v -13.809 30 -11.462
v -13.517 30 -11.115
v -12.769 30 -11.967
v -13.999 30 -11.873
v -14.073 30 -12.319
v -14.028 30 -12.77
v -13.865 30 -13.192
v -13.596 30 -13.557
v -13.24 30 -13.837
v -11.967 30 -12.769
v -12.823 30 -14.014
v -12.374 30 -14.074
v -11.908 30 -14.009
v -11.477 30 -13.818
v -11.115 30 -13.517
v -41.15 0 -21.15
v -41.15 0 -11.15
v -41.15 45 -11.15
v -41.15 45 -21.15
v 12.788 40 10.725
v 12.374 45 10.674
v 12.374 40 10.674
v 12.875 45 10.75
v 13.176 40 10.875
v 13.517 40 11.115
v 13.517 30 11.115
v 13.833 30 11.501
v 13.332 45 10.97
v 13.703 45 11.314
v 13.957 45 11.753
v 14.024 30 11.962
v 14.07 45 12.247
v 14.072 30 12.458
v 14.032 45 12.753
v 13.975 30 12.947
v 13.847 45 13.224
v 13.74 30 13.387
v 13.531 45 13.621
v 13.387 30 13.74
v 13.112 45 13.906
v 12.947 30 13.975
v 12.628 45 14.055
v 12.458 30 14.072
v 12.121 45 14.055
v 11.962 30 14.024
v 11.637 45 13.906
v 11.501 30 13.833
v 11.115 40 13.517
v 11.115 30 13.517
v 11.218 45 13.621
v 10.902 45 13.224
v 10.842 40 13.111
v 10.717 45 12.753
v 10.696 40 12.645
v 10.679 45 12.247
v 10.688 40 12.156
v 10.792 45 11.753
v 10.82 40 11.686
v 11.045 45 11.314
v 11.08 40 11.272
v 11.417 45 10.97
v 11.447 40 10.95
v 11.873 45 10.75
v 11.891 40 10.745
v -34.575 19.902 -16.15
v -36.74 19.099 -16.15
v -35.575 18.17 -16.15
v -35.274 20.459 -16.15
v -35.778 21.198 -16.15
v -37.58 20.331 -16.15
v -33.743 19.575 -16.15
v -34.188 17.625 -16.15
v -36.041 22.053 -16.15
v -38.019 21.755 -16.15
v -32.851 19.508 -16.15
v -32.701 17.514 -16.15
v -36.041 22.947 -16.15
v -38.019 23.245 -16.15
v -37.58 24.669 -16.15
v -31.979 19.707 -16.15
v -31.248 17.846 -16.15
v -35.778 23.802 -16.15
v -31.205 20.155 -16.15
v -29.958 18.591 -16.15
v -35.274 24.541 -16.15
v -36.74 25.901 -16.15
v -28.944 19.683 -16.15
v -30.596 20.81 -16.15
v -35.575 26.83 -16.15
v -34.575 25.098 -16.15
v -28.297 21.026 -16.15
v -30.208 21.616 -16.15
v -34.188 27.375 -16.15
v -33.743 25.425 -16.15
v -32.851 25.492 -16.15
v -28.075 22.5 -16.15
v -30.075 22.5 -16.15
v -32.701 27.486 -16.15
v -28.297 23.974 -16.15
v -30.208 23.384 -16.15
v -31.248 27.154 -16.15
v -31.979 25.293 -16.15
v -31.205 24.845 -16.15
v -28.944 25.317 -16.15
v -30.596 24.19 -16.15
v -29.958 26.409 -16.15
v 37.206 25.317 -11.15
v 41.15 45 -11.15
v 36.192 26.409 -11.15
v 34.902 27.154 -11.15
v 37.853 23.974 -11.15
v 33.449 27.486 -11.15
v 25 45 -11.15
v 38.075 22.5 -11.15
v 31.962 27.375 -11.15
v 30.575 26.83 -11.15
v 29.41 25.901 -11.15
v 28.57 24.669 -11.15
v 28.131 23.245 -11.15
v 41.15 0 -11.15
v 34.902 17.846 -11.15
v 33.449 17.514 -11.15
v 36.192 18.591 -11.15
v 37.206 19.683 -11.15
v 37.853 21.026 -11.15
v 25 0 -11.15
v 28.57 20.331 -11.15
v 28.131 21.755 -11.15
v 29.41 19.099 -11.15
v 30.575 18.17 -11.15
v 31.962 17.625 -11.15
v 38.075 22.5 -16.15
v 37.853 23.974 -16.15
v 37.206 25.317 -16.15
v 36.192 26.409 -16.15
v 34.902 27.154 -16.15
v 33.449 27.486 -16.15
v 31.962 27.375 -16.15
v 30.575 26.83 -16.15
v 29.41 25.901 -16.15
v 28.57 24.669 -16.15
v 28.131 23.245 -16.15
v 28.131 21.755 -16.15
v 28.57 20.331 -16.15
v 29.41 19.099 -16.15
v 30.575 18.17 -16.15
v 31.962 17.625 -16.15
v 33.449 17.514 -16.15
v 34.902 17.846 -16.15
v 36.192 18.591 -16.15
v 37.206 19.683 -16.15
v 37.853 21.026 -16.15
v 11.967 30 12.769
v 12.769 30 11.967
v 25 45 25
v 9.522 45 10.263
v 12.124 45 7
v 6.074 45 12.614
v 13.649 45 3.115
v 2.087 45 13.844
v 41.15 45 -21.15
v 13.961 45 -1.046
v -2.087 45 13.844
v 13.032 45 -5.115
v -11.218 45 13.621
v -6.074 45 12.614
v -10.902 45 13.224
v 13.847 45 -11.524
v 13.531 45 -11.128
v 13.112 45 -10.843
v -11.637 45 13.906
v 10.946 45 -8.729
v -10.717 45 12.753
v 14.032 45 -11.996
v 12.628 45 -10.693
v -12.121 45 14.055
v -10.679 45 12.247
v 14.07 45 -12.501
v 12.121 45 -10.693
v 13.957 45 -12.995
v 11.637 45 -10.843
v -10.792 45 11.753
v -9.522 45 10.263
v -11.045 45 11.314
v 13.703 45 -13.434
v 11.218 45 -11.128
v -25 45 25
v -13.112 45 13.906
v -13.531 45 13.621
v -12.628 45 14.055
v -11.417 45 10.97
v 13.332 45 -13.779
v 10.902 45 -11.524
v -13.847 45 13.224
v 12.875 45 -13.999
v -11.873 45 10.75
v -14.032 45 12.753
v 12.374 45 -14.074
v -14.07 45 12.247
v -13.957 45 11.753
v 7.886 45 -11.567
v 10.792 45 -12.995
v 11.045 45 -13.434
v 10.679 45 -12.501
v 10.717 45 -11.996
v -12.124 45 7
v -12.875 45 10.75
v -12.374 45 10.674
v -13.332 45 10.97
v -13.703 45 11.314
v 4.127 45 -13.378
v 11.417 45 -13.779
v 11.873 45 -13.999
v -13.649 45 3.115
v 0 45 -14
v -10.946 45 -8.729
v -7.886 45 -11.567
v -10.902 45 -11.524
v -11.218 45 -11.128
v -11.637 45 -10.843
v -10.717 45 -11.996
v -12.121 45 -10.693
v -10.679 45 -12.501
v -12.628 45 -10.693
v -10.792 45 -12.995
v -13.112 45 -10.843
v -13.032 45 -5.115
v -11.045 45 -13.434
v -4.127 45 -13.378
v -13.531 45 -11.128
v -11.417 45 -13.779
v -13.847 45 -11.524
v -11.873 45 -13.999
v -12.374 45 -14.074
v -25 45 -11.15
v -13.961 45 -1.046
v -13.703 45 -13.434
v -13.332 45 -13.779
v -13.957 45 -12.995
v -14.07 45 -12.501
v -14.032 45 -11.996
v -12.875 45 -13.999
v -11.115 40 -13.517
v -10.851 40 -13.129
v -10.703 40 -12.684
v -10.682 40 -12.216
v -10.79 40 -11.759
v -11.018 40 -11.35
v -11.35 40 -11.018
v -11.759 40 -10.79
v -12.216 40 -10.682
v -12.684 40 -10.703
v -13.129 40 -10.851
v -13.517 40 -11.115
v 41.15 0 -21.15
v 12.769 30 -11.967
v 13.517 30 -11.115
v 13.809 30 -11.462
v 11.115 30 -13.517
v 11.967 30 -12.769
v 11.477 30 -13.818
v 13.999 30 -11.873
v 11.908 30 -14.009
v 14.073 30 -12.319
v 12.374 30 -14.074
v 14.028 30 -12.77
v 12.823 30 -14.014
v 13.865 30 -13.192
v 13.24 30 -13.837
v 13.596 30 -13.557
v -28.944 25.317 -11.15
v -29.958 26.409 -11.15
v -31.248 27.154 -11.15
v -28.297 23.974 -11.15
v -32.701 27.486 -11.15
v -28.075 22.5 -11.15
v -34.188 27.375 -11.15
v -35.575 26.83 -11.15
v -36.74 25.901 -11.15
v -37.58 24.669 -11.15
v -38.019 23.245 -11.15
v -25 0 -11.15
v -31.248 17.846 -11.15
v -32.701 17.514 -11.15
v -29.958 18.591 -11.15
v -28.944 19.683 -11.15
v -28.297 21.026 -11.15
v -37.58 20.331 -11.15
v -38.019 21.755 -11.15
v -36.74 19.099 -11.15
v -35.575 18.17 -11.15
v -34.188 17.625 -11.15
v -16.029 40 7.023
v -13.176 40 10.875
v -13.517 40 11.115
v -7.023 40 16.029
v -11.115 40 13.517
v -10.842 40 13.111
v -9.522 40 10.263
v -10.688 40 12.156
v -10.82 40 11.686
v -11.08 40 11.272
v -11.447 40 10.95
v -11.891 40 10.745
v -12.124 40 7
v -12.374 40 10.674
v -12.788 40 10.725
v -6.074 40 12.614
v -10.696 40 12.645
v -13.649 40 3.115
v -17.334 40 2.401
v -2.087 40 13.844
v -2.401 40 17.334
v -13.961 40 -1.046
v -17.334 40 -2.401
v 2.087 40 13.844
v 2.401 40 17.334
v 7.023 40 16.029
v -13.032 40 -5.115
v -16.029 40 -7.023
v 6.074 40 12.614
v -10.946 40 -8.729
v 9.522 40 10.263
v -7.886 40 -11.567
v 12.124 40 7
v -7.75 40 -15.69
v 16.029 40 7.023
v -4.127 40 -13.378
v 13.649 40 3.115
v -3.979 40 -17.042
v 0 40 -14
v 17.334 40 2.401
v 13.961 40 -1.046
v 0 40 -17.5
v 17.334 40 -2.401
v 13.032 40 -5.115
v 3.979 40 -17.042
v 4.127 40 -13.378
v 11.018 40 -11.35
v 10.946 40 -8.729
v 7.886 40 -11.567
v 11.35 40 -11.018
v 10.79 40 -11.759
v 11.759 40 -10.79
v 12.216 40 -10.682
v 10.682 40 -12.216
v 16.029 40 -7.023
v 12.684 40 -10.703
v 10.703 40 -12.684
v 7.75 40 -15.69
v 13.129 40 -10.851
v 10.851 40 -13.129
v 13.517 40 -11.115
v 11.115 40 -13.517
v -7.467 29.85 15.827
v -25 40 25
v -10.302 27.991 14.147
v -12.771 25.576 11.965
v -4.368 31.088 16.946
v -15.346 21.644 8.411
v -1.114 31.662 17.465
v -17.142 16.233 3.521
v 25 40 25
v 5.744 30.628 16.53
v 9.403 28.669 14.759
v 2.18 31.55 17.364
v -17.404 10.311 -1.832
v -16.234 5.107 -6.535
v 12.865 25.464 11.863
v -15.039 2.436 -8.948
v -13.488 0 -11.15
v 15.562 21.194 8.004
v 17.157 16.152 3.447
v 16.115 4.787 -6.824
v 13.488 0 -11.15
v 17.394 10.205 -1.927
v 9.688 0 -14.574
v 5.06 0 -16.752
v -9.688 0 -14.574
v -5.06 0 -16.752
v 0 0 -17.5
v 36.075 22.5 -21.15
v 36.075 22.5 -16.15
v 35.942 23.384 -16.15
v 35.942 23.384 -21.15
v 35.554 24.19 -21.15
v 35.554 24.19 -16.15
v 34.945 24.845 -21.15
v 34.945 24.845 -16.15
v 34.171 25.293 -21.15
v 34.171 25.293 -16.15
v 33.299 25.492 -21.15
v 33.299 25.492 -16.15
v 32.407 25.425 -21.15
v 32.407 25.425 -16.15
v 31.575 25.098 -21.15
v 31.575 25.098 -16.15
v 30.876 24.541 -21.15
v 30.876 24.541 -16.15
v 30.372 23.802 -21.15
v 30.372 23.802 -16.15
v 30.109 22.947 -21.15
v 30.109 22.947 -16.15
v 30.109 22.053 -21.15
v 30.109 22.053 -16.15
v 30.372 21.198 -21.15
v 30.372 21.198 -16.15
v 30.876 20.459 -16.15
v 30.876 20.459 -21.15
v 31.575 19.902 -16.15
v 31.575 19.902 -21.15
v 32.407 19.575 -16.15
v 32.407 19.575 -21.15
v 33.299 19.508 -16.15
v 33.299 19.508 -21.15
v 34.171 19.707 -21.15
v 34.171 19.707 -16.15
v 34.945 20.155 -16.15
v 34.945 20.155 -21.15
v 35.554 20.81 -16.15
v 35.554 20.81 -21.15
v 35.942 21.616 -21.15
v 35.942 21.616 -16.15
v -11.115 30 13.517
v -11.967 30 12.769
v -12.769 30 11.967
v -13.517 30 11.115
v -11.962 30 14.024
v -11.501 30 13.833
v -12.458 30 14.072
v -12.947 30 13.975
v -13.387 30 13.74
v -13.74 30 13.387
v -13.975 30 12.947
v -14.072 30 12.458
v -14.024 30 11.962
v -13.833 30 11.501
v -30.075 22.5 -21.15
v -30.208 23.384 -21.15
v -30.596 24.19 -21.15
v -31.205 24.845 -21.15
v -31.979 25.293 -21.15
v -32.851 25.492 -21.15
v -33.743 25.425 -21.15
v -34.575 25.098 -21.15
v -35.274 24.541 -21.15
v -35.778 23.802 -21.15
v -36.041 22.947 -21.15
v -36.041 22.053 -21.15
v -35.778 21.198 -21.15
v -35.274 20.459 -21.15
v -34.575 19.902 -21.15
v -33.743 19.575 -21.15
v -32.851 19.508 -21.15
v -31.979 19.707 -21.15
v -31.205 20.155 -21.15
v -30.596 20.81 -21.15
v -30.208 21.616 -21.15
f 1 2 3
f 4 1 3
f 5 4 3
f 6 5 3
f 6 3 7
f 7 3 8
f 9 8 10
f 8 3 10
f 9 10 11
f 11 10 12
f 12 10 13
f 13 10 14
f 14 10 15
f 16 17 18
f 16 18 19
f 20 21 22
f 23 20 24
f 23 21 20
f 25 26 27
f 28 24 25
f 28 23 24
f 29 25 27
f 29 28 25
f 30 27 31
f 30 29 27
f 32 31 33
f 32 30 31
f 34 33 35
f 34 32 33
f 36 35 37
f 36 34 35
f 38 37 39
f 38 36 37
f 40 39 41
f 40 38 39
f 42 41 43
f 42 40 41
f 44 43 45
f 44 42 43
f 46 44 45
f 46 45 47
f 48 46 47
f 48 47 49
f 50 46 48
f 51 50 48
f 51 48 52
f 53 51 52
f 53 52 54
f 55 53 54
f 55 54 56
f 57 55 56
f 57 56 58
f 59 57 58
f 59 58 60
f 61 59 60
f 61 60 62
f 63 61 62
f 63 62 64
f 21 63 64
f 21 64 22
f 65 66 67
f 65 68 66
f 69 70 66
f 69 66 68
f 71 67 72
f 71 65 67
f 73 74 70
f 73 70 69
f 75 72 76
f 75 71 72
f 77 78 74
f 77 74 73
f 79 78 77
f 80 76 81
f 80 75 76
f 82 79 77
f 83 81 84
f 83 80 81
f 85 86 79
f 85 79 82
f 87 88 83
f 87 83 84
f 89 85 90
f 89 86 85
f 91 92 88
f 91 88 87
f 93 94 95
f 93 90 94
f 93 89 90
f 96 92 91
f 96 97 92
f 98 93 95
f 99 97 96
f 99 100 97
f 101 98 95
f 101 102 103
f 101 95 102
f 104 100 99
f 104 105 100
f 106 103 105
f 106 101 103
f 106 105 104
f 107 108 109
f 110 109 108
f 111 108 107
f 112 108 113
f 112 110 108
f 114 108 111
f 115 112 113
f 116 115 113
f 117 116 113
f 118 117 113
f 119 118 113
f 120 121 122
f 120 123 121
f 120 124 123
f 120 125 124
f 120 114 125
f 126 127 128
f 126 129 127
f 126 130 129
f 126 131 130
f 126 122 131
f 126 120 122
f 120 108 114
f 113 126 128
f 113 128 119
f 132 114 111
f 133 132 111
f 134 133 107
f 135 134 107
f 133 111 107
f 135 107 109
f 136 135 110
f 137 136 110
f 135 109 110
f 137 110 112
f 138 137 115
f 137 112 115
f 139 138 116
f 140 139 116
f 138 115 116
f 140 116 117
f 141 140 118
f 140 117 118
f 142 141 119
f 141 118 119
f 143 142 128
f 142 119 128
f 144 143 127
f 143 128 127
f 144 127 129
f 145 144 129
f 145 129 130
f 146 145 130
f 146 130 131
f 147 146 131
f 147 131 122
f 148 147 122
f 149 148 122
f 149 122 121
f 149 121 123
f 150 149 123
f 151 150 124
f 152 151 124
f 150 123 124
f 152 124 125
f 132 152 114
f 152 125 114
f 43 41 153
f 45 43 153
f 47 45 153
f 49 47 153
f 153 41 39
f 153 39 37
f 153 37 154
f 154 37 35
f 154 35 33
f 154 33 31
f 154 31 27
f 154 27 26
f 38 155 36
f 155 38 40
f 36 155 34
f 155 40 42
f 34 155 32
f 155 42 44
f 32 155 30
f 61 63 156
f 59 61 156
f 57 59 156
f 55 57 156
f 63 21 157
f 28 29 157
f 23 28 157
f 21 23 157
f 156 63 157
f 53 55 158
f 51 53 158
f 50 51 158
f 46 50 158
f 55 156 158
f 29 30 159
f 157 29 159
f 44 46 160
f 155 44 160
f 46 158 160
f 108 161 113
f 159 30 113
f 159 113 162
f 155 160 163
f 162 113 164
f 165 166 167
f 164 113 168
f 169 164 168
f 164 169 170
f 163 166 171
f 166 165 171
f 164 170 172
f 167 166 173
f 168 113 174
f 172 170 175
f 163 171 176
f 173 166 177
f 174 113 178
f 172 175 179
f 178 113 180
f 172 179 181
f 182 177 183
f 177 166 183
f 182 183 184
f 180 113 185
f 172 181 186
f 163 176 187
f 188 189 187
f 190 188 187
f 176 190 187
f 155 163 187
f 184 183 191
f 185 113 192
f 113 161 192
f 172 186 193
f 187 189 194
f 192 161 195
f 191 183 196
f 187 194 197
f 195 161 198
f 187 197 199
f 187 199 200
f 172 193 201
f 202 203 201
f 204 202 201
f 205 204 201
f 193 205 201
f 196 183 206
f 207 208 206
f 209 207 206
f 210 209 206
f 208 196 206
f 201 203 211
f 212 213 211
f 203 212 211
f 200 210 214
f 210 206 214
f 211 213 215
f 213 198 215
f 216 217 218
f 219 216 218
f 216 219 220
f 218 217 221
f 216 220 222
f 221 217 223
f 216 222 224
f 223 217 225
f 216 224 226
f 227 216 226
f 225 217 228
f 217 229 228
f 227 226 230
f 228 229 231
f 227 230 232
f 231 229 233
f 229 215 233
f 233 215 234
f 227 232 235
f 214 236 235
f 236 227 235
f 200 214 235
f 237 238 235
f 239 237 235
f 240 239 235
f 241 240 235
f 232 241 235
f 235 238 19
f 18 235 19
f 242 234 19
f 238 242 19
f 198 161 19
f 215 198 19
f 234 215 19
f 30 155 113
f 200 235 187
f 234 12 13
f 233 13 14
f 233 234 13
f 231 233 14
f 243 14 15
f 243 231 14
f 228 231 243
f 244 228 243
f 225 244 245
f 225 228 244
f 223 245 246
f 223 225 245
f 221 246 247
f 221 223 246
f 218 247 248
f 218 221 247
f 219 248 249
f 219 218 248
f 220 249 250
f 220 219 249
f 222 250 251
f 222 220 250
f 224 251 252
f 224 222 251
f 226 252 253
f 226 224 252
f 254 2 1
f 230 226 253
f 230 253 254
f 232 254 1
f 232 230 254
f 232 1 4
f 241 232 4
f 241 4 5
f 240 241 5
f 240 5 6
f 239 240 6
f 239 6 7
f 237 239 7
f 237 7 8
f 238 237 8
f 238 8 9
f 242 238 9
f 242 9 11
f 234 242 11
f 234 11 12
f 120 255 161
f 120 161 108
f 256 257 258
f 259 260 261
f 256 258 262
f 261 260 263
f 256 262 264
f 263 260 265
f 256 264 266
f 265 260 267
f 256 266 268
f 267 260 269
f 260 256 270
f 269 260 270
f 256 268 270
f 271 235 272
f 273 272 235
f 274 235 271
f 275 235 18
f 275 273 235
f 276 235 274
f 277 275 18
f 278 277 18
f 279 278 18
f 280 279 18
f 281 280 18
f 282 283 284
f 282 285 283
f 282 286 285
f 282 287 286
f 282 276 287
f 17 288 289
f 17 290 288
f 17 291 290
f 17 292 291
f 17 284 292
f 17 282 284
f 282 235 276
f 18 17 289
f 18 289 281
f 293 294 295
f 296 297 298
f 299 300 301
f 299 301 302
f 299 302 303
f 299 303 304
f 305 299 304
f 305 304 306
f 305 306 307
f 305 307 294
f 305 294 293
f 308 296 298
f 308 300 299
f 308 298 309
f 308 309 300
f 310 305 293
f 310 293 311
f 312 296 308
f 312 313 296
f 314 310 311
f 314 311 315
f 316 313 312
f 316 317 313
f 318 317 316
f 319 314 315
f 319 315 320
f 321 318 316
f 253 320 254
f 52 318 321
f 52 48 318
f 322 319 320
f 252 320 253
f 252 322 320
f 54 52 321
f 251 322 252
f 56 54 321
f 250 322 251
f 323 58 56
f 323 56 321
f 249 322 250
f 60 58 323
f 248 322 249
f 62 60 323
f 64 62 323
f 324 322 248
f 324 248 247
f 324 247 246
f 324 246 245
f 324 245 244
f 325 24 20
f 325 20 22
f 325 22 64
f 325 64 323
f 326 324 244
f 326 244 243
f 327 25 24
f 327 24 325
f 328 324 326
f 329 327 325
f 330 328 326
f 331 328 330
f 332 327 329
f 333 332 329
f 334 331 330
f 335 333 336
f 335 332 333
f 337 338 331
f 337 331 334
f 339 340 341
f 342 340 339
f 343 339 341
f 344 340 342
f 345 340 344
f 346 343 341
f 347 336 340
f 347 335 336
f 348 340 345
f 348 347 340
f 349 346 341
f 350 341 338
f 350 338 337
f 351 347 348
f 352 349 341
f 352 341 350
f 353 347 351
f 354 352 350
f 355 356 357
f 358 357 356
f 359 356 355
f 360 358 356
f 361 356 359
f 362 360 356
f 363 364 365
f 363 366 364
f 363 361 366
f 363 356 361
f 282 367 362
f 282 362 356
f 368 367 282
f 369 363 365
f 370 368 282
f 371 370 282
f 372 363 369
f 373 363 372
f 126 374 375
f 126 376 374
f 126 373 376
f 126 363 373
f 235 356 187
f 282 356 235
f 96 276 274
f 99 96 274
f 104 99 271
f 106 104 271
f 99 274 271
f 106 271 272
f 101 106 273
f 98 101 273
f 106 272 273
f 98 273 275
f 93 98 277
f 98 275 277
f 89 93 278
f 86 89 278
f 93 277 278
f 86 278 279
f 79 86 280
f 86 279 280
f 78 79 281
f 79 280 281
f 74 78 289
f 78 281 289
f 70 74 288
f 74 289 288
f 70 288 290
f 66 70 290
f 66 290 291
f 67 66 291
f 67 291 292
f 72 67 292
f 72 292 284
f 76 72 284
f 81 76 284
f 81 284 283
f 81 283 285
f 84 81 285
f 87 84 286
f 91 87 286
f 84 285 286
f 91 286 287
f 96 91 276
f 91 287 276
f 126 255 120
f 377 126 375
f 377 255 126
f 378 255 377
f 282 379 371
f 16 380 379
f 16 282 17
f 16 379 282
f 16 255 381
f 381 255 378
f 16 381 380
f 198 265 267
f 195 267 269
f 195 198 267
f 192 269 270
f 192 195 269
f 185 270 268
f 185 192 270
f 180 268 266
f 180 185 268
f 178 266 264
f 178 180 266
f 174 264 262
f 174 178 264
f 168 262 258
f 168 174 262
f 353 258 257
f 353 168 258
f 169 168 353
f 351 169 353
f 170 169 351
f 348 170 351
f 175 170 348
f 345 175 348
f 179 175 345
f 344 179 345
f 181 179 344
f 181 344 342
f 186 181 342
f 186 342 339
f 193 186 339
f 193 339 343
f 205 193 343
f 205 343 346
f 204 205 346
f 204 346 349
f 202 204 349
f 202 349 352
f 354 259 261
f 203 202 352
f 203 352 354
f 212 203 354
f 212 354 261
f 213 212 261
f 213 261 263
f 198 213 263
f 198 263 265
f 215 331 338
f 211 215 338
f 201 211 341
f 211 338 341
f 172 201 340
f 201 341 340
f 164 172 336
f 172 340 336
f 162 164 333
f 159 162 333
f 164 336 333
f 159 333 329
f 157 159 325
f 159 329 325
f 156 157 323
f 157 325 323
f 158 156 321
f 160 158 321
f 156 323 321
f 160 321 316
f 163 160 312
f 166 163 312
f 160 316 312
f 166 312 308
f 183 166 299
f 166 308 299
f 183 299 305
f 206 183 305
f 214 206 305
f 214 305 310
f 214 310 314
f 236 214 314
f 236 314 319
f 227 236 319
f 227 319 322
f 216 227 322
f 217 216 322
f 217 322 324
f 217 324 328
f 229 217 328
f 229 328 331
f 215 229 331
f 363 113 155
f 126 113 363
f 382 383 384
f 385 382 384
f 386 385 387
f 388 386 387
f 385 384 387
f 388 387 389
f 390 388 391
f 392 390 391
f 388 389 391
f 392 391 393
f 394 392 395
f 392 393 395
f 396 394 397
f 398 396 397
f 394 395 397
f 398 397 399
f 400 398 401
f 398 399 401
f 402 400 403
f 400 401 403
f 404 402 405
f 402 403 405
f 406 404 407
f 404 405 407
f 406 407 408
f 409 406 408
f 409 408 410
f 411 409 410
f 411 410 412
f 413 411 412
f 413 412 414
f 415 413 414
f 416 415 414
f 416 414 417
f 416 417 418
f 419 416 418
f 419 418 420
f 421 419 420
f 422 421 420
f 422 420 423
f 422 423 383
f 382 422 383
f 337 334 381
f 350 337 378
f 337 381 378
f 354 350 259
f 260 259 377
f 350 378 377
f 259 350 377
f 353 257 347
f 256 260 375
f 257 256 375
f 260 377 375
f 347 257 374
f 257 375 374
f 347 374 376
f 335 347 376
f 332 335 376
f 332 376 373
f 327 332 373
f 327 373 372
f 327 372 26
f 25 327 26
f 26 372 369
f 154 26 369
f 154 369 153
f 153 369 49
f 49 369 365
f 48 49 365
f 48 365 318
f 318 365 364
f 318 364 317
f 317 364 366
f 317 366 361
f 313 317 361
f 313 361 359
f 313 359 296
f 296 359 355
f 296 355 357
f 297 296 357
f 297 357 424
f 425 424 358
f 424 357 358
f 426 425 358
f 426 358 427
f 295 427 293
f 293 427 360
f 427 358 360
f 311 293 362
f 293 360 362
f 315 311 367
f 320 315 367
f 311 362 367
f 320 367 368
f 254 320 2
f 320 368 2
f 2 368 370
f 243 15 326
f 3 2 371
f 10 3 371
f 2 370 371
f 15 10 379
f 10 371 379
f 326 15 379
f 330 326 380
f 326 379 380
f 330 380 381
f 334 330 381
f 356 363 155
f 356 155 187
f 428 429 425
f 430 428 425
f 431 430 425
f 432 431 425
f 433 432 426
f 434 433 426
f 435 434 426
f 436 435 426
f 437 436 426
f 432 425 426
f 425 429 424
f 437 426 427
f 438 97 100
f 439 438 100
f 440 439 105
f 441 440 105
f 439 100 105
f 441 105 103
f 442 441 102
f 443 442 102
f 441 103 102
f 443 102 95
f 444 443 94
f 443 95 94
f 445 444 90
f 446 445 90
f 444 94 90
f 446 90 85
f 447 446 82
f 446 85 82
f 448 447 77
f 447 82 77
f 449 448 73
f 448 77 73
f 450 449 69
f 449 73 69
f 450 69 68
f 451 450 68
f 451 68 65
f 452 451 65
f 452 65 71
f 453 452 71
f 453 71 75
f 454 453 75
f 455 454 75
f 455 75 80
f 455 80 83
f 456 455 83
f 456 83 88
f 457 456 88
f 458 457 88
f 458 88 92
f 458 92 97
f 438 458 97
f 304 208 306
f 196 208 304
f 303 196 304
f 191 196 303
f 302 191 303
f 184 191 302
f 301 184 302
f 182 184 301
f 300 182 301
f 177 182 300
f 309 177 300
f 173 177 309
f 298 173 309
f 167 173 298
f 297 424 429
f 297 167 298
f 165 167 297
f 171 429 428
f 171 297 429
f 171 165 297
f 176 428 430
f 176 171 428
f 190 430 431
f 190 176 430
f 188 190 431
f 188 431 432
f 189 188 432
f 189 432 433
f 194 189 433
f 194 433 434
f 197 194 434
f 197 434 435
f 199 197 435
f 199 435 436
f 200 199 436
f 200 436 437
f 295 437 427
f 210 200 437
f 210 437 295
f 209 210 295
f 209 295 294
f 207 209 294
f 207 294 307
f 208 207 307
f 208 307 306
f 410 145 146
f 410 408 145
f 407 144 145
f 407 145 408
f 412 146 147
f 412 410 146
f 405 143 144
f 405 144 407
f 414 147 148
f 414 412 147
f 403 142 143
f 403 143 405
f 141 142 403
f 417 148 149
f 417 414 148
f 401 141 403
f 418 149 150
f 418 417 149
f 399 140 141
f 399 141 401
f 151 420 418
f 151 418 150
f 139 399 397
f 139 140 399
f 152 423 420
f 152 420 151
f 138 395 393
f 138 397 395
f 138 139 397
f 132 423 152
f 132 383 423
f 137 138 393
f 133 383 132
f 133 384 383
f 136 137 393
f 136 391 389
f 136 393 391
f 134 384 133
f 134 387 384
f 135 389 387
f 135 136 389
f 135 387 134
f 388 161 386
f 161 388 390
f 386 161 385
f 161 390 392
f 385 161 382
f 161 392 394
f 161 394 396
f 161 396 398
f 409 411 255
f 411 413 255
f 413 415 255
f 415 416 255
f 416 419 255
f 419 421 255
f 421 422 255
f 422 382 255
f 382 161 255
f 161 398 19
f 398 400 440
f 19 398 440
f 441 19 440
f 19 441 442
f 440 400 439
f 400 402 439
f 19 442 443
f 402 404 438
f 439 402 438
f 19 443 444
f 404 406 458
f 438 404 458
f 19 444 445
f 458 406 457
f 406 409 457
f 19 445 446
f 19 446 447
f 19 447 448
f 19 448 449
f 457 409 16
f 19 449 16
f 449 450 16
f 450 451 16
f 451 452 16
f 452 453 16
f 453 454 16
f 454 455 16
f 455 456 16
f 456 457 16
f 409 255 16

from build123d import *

# Parameters (mm, degrees)
EXTRUDE_1_DEPTH          = 45
SKETCH_2_R               = 17.5
CUT_EXTRUDE_1_DEPTH      = 40
SKETCH_3_R               = 14
CUT_EXTRUDE_2_DEPTH      = 63.596505494
CUT_EXTRUDE_3_DEPTH      = 10
CUT_EXTRUDE_3_DEPTH_BACK = 14
SKETCH_4_R               = 1.7
SKETCH_5_R               = 3
CUT_EXTRUDE_4_DEPTH      = 71.888257138
SKETCH_6_R               = 5
CUT_EXTRUDE_5_DEPTH      = 5
CUT_EXTRUDE_6_DEPTH      = 84.820179551


with BuildPart() as part:
    # Эскиз1 → Бобышка-Вытянуть1 (new body)
    with BuildSketch(Plane(origin=(0, 0, 0), x_dir=(1, 0, 0), z_dir=(0, 1, 0))):
        Polygon((-21.15, 21.15), (21.15, 21.15), (41.15, 21.15), (41.15, 11.15), (25, 11.15), (25, -25), (-25, -25), (-25, 11.15), (-41.15, 11.15), (-41.15, 21.15), align=None)
    extrude(amount=EXTRUDE_1_DEPTH)

    # Эскиз2 → Вырез-Вытянуть1 (cut)
    with BuildSketch(Plane.XZ):
        with Locations(Location((0, 0, 0), (0, 0, 270))):
            Circle(SKETCH_2_R)
    extrude(amount=-CUT_EXTRUDE_1_DEPTH, mode=Mode.SUBTRACT)

    # Эскиз3 → Вырез-Вытянуть2 (cut, through all)
    with BuildSketch(Plane.XZ.offset(-40)):
        with Locations(Location((0, 0, 0), (0, 0, 270))):
            Circle(SKETCH_3_R)
    extrude(amount=-CUT_EXTRUDE_2_DEPTH, mode=Mode.SUBTRACT)

    # Эскиз4 → Вырез-Вытянуть3 (cut, two sides: drawn at the far end of the back side and taken through both)
    with BuildSketch(Plane.XZ.offset(-40).offset(-CUT_EXTRUDE_3_DEPTH_BACK)):
        with Locations(Location((-12.374368671, -12.374368671, 0), (0, 0, 270))):
            Circle(SKETCH_4_R)
        with Locations(Location((12.374368671, -12.374368671, 0), (0, 0, 270))):
            Circle(SKETCH_4_R)
        with Locations(Location((12.374368671, 12.374368671, 0), (0, 0, 270))):
            Circle(SKETCH_4_R)
        with Locations(Location((-12.374368671, 12.374368671, 0), (0, 0, 270))):
            Circle(SKETCH_4_R)
    extrude(amount=CUT_EXTRUDE_3_DEPTH + CUT_EXTRUDE_3_DEPTH_BACK, mode=Mode.SUBTRACT)

    # Эскиз5 → Вырез-Вытянуть4 (cut, through all)
    with BuildSketch(Plane.XY.offset(-11.15)):
        with Locations((-33.075, 22.5)):
            Circle(SKETCH_5_R)
        with Locations((33.075, 22.5)):
            Circle(SKETCH_5_R)
    extrude(amount=-CUT_EXTRUDE_4_DEPTH, mode=Mode.SUBTRACT)

    # Эскиз6 → Вырез-Вытянуть5 (cut)
    with BuildSketch(Plane.XY.offset(-11.15)):
        with Locations((-33.075, 22.5)):
            Circle(SKETCH_6_R)
        with Locations((33.075, 22.5)):
            Circle(SKETCH_6_R)
    extrude(amount=-CUT_EXTRUDE_5_DEPTH, mode=Mode.SUBTRACT)

    # Эскиз7 → Вырез-Вытянуть6 (cut, through all)
    with BuildSketch(Plane(origin=(25, 0, 0), x_dir=(0, 0, -1), z_dir=(1, 0, 0))):
        Polygon((-25, 40), (11.15, 0), (-25, 0), align=None)
    extrude(amount=-CUT_EXTRUDE_6_DEPTH, mode=Mode.SUBTRACT)


solid = part.part
